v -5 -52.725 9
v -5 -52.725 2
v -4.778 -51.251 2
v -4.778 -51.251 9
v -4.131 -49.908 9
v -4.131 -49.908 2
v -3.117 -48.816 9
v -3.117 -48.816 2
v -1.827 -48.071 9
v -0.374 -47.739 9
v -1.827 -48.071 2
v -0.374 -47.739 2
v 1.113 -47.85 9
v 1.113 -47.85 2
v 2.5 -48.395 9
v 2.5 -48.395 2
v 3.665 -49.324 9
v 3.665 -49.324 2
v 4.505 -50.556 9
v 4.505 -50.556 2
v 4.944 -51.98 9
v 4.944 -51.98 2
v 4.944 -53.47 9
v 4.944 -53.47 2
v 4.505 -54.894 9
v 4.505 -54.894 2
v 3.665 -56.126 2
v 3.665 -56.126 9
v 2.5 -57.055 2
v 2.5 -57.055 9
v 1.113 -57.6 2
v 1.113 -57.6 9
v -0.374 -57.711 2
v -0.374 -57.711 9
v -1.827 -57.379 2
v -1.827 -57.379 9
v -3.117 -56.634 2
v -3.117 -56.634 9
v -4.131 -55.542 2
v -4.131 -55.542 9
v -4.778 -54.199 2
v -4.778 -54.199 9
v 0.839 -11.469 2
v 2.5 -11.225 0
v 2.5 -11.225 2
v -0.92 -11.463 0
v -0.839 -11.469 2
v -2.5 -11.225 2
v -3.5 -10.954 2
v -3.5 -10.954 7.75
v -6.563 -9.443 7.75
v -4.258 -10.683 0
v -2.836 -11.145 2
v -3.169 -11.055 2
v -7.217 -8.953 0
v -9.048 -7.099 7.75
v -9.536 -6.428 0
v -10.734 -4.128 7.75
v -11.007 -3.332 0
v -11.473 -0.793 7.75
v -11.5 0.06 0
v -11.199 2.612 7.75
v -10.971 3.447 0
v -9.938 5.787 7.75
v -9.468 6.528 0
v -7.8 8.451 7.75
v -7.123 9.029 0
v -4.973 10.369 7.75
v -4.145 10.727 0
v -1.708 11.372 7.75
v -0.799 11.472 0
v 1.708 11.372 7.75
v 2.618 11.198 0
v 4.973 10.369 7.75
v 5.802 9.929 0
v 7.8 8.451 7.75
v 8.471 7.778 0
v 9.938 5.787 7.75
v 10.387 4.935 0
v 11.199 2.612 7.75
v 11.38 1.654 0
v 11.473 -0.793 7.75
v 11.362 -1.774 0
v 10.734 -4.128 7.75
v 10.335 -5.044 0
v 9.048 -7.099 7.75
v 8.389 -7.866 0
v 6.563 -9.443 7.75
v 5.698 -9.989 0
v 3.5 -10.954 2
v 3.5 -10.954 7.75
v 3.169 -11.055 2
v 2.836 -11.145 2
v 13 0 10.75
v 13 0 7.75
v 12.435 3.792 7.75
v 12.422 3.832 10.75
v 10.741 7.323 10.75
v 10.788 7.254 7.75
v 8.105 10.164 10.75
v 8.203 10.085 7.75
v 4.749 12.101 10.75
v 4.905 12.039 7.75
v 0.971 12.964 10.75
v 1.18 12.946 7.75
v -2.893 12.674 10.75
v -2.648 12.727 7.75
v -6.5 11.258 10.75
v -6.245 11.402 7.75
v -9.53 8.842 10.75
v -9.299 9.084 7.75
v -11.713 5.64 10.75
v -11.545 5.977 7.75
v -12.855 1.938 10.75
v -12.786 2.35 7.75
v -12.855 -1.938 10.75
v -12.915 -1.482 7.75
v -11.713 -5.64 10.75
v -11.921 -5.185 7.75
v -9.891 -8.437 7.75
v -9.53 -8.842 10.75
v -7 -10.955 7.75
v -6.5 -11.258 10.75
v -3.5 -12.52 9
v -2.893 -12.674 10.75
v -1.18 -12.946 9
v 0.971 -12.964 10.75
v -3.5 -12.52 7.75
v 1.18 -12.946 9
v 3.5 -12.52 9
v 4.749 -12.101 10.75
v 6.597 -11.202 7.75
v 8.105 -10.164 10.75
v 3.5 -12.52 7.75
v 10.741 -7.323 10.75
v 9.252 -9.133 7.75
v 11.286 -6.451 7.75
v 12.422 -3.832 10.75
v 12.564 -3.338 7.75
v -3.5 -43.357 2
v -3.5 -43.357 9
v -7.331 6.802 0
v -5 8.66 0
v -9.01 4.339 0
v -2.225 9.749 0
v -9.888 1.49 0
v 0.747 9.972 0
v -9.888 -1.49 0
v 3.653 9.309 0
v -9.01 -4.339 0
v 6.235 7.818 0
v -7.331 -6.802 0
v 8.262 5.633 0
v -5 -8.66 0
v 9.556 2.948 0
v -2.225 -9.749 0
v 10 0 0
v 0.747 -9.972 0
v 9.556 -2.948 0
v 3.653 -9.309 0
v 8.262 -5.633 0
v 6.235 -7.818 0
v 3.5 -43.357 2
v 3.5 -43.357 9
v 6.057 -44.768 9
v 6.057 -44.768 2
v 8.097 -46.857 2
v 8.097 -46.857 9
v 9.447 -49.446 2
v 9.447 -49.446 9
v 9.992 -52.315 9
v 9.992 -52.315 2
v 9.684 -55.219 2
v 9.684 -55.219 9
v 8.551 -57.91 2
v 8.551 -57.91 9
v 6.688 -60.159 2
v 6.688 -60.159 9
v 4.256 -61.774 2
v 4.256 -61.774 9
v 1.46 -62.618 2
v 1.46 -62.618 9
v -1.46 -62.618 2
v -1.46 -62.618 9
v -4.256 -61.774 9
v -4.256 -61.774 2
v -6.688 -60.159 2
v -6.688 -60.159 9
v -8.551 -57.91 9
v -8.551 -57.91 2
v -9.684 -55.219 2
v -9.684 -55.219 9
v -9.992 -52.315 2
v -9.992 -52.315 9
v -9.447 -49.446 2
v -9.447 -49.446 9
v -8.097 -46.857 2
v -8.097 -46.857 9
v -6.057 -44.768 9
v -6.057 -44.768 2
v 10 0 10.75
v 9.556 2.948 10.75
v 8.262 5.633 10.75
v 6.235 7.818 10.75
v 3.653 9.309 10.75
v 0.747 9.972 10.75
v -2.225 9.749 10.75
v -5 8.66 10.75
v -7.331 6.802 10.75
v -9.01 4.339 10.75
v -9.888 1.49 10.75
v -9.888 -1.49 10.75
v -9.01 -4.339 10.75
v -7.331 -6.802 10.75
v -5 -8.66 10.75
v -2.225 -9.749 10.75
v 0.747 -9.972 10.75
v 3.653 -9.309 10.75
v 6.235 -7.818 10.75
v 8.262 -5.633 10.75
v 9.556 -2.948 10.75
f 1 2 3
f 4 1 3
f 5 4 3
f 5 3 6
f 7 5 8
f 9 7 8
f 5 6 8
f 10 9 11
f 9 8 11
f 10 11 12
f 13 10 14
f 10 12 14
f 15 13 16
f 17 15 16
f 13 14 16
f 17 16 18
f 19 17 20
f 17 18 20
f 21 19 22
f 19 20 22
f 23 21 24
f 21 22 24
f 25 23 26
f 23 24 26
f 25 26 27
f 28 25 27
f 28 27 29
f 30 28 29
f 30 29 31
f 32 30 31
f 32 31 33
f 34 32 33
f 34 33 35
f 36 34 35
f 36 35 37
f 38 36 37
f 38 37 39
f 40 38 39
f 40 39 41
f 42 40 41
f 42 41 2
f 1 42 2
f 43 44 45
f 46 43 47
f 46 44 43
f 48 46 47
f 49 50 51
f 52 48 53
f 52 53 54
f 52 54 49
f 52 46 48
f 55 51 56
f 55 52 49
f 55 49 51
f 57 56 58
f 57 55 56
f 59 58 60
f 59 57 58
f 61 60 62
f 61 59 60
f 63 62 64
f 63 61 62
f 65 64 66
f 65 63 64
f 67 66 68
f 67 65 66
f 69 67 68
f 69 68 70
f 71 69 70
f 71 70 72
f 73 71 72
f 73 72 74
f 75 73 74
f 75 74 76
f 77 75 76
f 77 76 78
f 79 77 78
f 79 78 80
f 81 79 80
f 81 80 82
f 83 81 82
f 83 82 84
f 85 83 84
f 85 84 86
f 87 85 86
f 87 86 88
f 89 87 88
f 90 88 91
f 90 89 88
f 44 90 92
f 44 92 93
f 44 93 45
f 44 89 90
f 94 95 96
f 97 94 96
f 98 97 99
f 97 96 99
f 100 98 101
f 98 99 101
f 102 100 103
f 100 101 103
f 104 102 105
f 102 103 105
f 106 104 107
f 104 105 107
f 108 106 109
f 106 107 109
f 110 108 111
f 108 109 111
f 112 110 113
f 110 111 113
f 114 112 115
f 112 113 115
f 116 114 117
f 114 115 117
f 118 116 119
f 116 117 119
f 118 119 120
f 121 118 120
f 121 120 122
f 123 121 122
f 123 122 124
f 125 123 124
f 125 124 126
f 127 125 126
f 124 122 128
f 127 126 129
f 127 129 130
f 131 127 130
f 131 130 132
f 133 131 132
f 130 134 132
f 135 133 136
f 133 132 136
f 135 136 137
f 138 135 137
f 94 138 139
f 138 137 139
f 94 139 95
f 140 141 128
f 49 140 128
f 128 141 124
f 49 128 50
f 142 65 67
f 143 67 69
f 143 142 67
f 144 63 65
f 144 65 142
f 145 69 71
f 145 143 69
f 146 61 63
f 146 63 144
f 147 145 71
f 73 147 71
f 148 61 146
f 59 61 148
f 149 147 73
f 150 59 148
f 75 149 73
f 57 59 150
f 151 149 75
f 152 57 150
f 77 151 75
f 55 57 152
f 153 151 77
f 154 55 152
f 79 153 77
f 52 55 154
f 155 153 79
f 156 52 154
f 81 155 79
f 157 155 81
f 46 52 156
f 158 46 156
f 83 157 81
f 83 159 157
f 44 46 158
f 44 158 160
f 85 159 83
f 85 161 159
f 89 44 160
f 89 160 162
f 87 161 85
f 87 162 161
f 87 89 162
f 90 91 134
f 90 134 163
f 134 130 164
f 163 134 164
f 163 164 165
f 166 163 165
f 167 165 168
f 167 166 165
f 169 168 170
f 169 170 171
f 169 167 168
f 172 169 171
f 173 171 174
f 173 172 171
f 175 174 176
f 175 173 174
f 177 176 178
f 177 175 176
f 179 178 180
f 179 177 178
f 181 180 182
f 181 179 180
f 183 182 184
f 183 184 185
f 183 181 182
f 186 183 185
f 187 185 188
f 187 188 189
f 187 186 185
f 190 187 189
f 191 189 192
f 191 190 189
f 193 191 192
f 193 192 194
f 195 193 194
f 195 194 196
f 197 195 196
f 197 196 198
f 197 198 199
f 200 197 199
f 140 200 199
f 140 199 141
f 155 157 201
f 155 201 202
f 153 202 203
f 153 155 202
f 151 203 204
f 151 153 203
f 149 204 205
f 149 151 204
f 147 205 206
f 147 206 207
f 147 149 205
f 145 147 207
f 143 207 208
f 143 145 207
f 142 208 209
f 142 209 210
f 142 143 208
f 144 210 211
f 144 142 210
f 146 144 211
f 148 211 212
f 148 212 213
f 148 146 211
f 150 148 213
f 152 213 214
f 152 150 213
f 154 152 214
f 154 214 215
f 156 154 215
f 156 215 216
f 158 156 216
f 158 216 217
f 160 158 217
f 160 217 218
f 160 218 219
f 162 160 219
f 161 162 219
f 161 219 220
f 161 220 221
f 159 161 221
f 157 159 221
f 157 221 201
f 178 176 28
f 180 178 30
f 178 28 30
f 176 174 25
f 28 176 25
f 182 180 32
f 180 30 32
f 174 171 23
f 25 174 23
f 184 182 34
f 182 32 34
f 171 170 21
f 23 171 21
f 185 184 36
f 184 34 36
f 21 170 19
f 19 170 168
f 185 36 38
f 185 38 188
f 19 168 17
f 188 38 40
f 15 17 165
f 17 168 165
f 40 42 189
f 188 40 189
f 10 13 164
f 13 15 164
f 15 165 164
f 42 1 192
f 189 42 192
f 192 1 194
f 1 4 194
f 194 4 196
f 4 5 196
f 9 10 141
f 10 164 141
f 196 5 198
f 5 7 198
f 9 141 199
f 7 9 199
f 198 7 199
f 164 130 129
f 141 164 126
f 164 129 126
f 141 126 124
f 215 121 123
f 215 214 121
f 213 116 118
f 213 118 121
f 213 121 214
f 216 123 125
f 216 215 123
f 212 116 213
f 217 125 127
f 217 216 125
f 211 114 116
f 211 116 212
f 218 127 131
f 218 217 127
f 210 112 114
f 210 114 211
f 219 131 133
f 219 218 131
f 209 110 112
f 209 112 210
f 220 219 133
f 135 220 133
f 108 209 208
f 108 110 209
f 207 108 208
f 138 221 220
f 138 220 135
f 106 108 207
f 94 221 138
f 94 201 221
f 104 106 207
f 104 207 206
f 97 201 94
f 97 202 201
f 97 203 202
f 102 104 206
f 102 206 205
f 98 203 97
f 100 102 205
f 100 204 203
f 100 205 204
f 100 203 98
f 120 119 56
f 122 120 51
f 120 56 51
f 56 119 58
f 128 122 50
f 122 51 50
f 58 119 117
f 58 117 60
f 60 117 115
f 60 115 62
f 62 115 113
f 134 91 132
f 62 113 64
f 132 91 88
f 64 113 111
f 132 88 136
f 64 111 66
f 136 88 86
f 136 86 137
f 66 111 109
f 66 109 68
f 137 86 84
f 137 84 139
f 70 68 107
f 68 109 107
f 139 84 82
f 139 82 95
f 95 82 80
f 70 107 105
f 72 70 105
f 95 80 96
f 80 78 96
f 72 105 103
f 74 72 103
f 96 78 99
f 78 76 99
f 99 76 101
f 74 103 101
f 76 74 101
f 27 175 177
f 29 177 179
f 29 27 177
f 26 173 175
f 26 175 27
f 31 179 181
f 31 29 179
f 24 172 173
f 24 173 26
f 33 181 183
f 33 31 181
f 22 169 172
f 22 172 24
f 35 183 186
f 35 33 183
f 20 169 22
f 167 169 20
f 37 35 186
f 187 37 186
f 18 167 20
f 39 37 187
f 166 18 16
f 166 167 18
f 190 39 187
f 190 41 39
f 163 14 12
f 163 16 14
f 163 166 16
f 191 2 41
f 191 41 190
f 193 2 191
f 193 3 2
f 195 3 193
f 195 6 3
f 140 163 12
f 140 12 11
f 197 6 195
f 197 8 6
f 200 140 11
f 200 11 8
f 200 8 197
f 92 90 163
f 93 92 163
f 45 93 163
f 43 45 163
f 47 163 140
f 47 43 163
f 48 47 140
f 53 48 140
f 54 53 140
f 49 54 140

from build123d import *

# Parameters (mm, degrees)
CROQUIS1_R               = 10
SALIENTE_EXTRUIR1_DEPTH  = 3
CROQUIS2_R               = 11.5
CROQUIS2_R_2             = 10
SALIENTE_EXTRUIR3_DEPTH  = 8
SALIENTE_EXTRUIR4_START  = 3
CROQUIS3_R               = 11.5
CROQUIS3_R_2             = 10
SALIENTE_EXTRUIR4_DEPTH  = 3
SALIENTE_EXTRUIR5_DEPTH  = 8
CROQUIS11_W              = 0.560242515
CROQUIS11_H              = 6
CORTAR_EXTRUIR3_DEPTH    = 8
CROQUIS12_W              = 2.5
CROQUIS12_H              = 0.622045166
SALIENTE_EXTRUIR6_DEPTH  = 3
CROQUIS13_W              = 5
CROQUIS13_H              = 50.27502784
SALIENTE_EXTRUIR7_DEPTH  = 8
CROQUIS15_W              = 2
CROQUIS15_H              = 50.27502784
CORTAR_EXTRUIR4_DEPTH    = 8
SALIENTE_EXTRUIR8_DEPTH  = 7
CROQUIS21_R              = 10
SALIENTE_EXTRUIR9_DEPTH  = 7
CROQUIS22_R              = 5
CORTAR_EXTRUIR5_DEPTH    = 30
CROQUIS23_R              = 10
SALIENTE_EXTRUIR10_DEPTH = 1.25
CORTAR_EXTRUIR6_START    = -1.5
CROQUIS24_R              = 10
CORTAR_EXTRUIR6_DEPTH    = 1.5
SALIENTE_EXTRUIR11_START = -3
CROQUIS25_R              = 13
SALIENTE_EXTRUIR11_DEPTH = 3
CORTAR_EXTRUIR14_START   = -10
CROQUIS30_R              = 10
CORTAR_EXTRUIR14_DEPTH   = 10
CROQUIS31_R              = 11.5
CROQUIS31_R_2            = 10
SALIENTE_EXTRUIR12_DEPTH = 7.75


with BuildPart() as part:
    # Croquis1 → Saliente-Extruir1 (new body)
    with BuildSketch(Plane.XY):
        Circle(CROQUIS1_R)
    extrude(amount=SALIENTE_EXTRUIR1_DEPTH)



with BuildPart() as body_2:
    # Croquis2 → Saliente-Extruir3 (new body)
    with BuildSketch(Plane.XY.offset(3)):
        Circle(CROQUIS2_R)
        Circle(CROQUIS2_R_2, mode=Mode.SUBTRACT)
    extrude(amount=SALIENTE_EXTRUIR3_DEPTH)


with BuildPart() as part_1:
    add(part.part)

    add(body_2.part)  # Saliente-Extruir4 merges body 2
    # Croquis3 → Saliente-Extruir4 (add)
    with BuildSketch(Plane(origin=(0, 0, 3), x_dir=(-1, 0, 0), z_dir=(0, 0, -1)).offset(SALIENTE_EXTRUIR4_START)):
        with Locations(Location((0, 0, 0), (0, 0, 180))):
            Circle(CROQUIS3_R)
        with Locations(Location((0, 0, 0), (0, 0, 180))):
            Circle(CROQUIS3_R_2, mode=Mode.SUBTRACT)
    extrude(amount=-SALIENTE_EXTRUIR4_DEPTH)

    # Croquis12 → Saliente-Extruir6 (add)
    with BuildSketch(Plane.XY.offset(3)):
        with Locations((-1.25, -11.188977417)):
            Rectangle(CROQUIS12_W, CROQUIS12_H)
        with Locations((1.25, -11.188977417)):
            Rectangle(CROQUIS12_W, CROQUIS12_H)
        Polygon((2.5, -11.5), (2.5, -61.5), (-2.5, -61.5), (-2.5, -11.5), (0, -11.5), align=None)
    extrude(amount=-SALIENTE_EXTRUIR6_DEPTH)

    # Croquis13 → Saliente-Extruir7 (add)
    with BuildSketch(Plane.XY.offset(3)):
        with Locations((0, -36.36248608)):
            Rectangle(CROQUIS13_W, CROQUIS13_H)
    extrude(amount=SALIENTE_EXTRUIR7_DEPTH)

    # Croquis15 → Cortar-Extruir4 (cut)
    with BuildSketch(Plane(origin=(2.5, 0, 0), x_dir=(0, 0, -1), z_dir=(1, 0, 0))):
        with Locations((-10, -36.36248608)):
            Rectangle(CROQUIS15_W, CROQUIS15_H)
        with Locations((-1, -36.36248608)):
            Rectangle(CROQUIS15_W, CROQUIS15_H)
    extrude(amount=-CORTAR_EXTRUIR4_DEPTH, mode=Mode.SUBTRACT)

    # Croquis16 → Saliente-Extruir8 (add)
    with BuildSketch(Plane.XY.offset(9)):
        Polygon((-2.5, -61.5), (-3.5, -61.5), (-3.5, -10.232955502), (3.5, -10.232955502), (3.5, -61.5), (2.5, -61.5), align=None)
    extrude(amount=-SALIENTE_EXTRUIR8_DEPTH)

    # Croquis21 → Saliente-Extruir9 (add)
    with BuildSketch(Plane(origin=(0, 0, 2), x_dir=(-1, 0, 0), z_dir=(0, 0, -1))):
        with Locations((0, -52.72497216)):
            Circle(CROQUIS21_R)
    extrude(amount=-SALIENTE_EXTRUIR9_DEPTH)

    # Croquis22 → Cortar-Extruir5 (cut)
    with BuildSketch(Plane(origin=(0, 0, 2), x_dir=(-1, 0, 0), z_dir=(0, 0, -1))):
        with Locations((0, -52.72497216)):
            Circle(CROQUIS22_R)
    extrude(amount=-CORTAR_EXTRUIR5_DEPTH, mode=Mode.SUBTRACT)

    # Croquis23 → Saliente-Extruir10 (add)
    with BuildSketch(Plane.XY.offset(11)):
        with BuildLine():
            Line((-2.5, -11.22497216), (2.5, -11.22497216))
            ThreePointArc((2.5, -11.22497216), (0, 11.5), (-2.5, -11.22497216))
        make_face()
        Circle(CROQUIS23_R, mode=Mode.SUBTRACT)
    extrude(amount=SALIENTE_EXTRUIR10_DEPTH)

    # Croquis24 → Cortar-Extruir6 (cut)
    with BuildSketch(Plane.XY.offset(12.25).offset(CORTAR_EXTRUIR6_START)):
        with BuildLine():
            Line((-2.5, -11.22497216), (2.5, -11.22497216))
            ThreePointArc((2.5, -11.22497216), (0, 11.5), (-2.5, -11.22497216))
        make_face()
        Circle(CROQUIS24_R, mode=Mode.SUBTRACT)
    extrude(amount=CORTAR_EXTRUIR6_DEPTH, mode=Mode.SUBTRACT)

    # Croquis25 → Saliente-Extruir11 (add)
    with BuildSketch(Plane.XY.offset(10.75).offset(SALIENTE_EXTRUIR11_START)):
        Circle(CROQUIS25_R)
        with BuildLine():
            ThreePointArc((2.5, -11.22497216), (0, 11.5), (-2.5, -11.22497216))
            Line((-2.5, -11.22497216), (2.5, -11.22497216))
        make_face(mode=Mode.SUBTRACT)
    extrude(amount=SALIENTE_EXTRUIR11_DEPTH)

    # Croquis30 → Cortar-Extruir14 (cut)
    with BuildSketch(Plane.XY.offset(3).offset(CORTAR_EXTRUIR14_START)):
        Circle(CROQUIS30_R)
    extrude(amount=CORTAR_EXTRUIR14_DEPTH, mode=Mode.SUBTRACT)

    # Croquis31 → Saliente-Extruir12 (add)
    with BuildSketch(Plane(origin=(0, 0, 0), x_dir=(-1, 0, 0), z_dir=(0, 0, -1))):
        with Locations(Location((0, 0, 0), (0, 0, 180))):
            Circle(CROQUIS31_R)
        with Locations(Location((0, 0, 0), (0, 0, 180))):
            Circle(CROQUIS31_R_2, mode=Mode.SUBTRACT)
    extrude(amount=-SALIENTE_EXTRUIR12_DEPTH)


with BuildPart() as body_2_2:
    # Croquis9 → Saliente-Extruir5 (new body)
    with BuildSketch(Plane.XY.offset(11)):
        Polygon((11.5, 0), (11.5, 3), (12.060242515, 3), (12.060242515, -3), (11.5, -3), align=None)
    extrude(amount=-SALIENTE_EXTRUIR5_DEPTH)

    # Croquis11 → Cortar-Extruir3 (cut)
    with BuildSketch(Plane.XY.offset(11)):
        with Locations((11.780121257, 0)):
            Rectangle(CROQUIS11_W, CROQUIS11_H)
    extrude(amount=-CORTAR_EXTRUIR3_DEPTH, mode=Mode.SUBTRACT)


solid = part_1.part
